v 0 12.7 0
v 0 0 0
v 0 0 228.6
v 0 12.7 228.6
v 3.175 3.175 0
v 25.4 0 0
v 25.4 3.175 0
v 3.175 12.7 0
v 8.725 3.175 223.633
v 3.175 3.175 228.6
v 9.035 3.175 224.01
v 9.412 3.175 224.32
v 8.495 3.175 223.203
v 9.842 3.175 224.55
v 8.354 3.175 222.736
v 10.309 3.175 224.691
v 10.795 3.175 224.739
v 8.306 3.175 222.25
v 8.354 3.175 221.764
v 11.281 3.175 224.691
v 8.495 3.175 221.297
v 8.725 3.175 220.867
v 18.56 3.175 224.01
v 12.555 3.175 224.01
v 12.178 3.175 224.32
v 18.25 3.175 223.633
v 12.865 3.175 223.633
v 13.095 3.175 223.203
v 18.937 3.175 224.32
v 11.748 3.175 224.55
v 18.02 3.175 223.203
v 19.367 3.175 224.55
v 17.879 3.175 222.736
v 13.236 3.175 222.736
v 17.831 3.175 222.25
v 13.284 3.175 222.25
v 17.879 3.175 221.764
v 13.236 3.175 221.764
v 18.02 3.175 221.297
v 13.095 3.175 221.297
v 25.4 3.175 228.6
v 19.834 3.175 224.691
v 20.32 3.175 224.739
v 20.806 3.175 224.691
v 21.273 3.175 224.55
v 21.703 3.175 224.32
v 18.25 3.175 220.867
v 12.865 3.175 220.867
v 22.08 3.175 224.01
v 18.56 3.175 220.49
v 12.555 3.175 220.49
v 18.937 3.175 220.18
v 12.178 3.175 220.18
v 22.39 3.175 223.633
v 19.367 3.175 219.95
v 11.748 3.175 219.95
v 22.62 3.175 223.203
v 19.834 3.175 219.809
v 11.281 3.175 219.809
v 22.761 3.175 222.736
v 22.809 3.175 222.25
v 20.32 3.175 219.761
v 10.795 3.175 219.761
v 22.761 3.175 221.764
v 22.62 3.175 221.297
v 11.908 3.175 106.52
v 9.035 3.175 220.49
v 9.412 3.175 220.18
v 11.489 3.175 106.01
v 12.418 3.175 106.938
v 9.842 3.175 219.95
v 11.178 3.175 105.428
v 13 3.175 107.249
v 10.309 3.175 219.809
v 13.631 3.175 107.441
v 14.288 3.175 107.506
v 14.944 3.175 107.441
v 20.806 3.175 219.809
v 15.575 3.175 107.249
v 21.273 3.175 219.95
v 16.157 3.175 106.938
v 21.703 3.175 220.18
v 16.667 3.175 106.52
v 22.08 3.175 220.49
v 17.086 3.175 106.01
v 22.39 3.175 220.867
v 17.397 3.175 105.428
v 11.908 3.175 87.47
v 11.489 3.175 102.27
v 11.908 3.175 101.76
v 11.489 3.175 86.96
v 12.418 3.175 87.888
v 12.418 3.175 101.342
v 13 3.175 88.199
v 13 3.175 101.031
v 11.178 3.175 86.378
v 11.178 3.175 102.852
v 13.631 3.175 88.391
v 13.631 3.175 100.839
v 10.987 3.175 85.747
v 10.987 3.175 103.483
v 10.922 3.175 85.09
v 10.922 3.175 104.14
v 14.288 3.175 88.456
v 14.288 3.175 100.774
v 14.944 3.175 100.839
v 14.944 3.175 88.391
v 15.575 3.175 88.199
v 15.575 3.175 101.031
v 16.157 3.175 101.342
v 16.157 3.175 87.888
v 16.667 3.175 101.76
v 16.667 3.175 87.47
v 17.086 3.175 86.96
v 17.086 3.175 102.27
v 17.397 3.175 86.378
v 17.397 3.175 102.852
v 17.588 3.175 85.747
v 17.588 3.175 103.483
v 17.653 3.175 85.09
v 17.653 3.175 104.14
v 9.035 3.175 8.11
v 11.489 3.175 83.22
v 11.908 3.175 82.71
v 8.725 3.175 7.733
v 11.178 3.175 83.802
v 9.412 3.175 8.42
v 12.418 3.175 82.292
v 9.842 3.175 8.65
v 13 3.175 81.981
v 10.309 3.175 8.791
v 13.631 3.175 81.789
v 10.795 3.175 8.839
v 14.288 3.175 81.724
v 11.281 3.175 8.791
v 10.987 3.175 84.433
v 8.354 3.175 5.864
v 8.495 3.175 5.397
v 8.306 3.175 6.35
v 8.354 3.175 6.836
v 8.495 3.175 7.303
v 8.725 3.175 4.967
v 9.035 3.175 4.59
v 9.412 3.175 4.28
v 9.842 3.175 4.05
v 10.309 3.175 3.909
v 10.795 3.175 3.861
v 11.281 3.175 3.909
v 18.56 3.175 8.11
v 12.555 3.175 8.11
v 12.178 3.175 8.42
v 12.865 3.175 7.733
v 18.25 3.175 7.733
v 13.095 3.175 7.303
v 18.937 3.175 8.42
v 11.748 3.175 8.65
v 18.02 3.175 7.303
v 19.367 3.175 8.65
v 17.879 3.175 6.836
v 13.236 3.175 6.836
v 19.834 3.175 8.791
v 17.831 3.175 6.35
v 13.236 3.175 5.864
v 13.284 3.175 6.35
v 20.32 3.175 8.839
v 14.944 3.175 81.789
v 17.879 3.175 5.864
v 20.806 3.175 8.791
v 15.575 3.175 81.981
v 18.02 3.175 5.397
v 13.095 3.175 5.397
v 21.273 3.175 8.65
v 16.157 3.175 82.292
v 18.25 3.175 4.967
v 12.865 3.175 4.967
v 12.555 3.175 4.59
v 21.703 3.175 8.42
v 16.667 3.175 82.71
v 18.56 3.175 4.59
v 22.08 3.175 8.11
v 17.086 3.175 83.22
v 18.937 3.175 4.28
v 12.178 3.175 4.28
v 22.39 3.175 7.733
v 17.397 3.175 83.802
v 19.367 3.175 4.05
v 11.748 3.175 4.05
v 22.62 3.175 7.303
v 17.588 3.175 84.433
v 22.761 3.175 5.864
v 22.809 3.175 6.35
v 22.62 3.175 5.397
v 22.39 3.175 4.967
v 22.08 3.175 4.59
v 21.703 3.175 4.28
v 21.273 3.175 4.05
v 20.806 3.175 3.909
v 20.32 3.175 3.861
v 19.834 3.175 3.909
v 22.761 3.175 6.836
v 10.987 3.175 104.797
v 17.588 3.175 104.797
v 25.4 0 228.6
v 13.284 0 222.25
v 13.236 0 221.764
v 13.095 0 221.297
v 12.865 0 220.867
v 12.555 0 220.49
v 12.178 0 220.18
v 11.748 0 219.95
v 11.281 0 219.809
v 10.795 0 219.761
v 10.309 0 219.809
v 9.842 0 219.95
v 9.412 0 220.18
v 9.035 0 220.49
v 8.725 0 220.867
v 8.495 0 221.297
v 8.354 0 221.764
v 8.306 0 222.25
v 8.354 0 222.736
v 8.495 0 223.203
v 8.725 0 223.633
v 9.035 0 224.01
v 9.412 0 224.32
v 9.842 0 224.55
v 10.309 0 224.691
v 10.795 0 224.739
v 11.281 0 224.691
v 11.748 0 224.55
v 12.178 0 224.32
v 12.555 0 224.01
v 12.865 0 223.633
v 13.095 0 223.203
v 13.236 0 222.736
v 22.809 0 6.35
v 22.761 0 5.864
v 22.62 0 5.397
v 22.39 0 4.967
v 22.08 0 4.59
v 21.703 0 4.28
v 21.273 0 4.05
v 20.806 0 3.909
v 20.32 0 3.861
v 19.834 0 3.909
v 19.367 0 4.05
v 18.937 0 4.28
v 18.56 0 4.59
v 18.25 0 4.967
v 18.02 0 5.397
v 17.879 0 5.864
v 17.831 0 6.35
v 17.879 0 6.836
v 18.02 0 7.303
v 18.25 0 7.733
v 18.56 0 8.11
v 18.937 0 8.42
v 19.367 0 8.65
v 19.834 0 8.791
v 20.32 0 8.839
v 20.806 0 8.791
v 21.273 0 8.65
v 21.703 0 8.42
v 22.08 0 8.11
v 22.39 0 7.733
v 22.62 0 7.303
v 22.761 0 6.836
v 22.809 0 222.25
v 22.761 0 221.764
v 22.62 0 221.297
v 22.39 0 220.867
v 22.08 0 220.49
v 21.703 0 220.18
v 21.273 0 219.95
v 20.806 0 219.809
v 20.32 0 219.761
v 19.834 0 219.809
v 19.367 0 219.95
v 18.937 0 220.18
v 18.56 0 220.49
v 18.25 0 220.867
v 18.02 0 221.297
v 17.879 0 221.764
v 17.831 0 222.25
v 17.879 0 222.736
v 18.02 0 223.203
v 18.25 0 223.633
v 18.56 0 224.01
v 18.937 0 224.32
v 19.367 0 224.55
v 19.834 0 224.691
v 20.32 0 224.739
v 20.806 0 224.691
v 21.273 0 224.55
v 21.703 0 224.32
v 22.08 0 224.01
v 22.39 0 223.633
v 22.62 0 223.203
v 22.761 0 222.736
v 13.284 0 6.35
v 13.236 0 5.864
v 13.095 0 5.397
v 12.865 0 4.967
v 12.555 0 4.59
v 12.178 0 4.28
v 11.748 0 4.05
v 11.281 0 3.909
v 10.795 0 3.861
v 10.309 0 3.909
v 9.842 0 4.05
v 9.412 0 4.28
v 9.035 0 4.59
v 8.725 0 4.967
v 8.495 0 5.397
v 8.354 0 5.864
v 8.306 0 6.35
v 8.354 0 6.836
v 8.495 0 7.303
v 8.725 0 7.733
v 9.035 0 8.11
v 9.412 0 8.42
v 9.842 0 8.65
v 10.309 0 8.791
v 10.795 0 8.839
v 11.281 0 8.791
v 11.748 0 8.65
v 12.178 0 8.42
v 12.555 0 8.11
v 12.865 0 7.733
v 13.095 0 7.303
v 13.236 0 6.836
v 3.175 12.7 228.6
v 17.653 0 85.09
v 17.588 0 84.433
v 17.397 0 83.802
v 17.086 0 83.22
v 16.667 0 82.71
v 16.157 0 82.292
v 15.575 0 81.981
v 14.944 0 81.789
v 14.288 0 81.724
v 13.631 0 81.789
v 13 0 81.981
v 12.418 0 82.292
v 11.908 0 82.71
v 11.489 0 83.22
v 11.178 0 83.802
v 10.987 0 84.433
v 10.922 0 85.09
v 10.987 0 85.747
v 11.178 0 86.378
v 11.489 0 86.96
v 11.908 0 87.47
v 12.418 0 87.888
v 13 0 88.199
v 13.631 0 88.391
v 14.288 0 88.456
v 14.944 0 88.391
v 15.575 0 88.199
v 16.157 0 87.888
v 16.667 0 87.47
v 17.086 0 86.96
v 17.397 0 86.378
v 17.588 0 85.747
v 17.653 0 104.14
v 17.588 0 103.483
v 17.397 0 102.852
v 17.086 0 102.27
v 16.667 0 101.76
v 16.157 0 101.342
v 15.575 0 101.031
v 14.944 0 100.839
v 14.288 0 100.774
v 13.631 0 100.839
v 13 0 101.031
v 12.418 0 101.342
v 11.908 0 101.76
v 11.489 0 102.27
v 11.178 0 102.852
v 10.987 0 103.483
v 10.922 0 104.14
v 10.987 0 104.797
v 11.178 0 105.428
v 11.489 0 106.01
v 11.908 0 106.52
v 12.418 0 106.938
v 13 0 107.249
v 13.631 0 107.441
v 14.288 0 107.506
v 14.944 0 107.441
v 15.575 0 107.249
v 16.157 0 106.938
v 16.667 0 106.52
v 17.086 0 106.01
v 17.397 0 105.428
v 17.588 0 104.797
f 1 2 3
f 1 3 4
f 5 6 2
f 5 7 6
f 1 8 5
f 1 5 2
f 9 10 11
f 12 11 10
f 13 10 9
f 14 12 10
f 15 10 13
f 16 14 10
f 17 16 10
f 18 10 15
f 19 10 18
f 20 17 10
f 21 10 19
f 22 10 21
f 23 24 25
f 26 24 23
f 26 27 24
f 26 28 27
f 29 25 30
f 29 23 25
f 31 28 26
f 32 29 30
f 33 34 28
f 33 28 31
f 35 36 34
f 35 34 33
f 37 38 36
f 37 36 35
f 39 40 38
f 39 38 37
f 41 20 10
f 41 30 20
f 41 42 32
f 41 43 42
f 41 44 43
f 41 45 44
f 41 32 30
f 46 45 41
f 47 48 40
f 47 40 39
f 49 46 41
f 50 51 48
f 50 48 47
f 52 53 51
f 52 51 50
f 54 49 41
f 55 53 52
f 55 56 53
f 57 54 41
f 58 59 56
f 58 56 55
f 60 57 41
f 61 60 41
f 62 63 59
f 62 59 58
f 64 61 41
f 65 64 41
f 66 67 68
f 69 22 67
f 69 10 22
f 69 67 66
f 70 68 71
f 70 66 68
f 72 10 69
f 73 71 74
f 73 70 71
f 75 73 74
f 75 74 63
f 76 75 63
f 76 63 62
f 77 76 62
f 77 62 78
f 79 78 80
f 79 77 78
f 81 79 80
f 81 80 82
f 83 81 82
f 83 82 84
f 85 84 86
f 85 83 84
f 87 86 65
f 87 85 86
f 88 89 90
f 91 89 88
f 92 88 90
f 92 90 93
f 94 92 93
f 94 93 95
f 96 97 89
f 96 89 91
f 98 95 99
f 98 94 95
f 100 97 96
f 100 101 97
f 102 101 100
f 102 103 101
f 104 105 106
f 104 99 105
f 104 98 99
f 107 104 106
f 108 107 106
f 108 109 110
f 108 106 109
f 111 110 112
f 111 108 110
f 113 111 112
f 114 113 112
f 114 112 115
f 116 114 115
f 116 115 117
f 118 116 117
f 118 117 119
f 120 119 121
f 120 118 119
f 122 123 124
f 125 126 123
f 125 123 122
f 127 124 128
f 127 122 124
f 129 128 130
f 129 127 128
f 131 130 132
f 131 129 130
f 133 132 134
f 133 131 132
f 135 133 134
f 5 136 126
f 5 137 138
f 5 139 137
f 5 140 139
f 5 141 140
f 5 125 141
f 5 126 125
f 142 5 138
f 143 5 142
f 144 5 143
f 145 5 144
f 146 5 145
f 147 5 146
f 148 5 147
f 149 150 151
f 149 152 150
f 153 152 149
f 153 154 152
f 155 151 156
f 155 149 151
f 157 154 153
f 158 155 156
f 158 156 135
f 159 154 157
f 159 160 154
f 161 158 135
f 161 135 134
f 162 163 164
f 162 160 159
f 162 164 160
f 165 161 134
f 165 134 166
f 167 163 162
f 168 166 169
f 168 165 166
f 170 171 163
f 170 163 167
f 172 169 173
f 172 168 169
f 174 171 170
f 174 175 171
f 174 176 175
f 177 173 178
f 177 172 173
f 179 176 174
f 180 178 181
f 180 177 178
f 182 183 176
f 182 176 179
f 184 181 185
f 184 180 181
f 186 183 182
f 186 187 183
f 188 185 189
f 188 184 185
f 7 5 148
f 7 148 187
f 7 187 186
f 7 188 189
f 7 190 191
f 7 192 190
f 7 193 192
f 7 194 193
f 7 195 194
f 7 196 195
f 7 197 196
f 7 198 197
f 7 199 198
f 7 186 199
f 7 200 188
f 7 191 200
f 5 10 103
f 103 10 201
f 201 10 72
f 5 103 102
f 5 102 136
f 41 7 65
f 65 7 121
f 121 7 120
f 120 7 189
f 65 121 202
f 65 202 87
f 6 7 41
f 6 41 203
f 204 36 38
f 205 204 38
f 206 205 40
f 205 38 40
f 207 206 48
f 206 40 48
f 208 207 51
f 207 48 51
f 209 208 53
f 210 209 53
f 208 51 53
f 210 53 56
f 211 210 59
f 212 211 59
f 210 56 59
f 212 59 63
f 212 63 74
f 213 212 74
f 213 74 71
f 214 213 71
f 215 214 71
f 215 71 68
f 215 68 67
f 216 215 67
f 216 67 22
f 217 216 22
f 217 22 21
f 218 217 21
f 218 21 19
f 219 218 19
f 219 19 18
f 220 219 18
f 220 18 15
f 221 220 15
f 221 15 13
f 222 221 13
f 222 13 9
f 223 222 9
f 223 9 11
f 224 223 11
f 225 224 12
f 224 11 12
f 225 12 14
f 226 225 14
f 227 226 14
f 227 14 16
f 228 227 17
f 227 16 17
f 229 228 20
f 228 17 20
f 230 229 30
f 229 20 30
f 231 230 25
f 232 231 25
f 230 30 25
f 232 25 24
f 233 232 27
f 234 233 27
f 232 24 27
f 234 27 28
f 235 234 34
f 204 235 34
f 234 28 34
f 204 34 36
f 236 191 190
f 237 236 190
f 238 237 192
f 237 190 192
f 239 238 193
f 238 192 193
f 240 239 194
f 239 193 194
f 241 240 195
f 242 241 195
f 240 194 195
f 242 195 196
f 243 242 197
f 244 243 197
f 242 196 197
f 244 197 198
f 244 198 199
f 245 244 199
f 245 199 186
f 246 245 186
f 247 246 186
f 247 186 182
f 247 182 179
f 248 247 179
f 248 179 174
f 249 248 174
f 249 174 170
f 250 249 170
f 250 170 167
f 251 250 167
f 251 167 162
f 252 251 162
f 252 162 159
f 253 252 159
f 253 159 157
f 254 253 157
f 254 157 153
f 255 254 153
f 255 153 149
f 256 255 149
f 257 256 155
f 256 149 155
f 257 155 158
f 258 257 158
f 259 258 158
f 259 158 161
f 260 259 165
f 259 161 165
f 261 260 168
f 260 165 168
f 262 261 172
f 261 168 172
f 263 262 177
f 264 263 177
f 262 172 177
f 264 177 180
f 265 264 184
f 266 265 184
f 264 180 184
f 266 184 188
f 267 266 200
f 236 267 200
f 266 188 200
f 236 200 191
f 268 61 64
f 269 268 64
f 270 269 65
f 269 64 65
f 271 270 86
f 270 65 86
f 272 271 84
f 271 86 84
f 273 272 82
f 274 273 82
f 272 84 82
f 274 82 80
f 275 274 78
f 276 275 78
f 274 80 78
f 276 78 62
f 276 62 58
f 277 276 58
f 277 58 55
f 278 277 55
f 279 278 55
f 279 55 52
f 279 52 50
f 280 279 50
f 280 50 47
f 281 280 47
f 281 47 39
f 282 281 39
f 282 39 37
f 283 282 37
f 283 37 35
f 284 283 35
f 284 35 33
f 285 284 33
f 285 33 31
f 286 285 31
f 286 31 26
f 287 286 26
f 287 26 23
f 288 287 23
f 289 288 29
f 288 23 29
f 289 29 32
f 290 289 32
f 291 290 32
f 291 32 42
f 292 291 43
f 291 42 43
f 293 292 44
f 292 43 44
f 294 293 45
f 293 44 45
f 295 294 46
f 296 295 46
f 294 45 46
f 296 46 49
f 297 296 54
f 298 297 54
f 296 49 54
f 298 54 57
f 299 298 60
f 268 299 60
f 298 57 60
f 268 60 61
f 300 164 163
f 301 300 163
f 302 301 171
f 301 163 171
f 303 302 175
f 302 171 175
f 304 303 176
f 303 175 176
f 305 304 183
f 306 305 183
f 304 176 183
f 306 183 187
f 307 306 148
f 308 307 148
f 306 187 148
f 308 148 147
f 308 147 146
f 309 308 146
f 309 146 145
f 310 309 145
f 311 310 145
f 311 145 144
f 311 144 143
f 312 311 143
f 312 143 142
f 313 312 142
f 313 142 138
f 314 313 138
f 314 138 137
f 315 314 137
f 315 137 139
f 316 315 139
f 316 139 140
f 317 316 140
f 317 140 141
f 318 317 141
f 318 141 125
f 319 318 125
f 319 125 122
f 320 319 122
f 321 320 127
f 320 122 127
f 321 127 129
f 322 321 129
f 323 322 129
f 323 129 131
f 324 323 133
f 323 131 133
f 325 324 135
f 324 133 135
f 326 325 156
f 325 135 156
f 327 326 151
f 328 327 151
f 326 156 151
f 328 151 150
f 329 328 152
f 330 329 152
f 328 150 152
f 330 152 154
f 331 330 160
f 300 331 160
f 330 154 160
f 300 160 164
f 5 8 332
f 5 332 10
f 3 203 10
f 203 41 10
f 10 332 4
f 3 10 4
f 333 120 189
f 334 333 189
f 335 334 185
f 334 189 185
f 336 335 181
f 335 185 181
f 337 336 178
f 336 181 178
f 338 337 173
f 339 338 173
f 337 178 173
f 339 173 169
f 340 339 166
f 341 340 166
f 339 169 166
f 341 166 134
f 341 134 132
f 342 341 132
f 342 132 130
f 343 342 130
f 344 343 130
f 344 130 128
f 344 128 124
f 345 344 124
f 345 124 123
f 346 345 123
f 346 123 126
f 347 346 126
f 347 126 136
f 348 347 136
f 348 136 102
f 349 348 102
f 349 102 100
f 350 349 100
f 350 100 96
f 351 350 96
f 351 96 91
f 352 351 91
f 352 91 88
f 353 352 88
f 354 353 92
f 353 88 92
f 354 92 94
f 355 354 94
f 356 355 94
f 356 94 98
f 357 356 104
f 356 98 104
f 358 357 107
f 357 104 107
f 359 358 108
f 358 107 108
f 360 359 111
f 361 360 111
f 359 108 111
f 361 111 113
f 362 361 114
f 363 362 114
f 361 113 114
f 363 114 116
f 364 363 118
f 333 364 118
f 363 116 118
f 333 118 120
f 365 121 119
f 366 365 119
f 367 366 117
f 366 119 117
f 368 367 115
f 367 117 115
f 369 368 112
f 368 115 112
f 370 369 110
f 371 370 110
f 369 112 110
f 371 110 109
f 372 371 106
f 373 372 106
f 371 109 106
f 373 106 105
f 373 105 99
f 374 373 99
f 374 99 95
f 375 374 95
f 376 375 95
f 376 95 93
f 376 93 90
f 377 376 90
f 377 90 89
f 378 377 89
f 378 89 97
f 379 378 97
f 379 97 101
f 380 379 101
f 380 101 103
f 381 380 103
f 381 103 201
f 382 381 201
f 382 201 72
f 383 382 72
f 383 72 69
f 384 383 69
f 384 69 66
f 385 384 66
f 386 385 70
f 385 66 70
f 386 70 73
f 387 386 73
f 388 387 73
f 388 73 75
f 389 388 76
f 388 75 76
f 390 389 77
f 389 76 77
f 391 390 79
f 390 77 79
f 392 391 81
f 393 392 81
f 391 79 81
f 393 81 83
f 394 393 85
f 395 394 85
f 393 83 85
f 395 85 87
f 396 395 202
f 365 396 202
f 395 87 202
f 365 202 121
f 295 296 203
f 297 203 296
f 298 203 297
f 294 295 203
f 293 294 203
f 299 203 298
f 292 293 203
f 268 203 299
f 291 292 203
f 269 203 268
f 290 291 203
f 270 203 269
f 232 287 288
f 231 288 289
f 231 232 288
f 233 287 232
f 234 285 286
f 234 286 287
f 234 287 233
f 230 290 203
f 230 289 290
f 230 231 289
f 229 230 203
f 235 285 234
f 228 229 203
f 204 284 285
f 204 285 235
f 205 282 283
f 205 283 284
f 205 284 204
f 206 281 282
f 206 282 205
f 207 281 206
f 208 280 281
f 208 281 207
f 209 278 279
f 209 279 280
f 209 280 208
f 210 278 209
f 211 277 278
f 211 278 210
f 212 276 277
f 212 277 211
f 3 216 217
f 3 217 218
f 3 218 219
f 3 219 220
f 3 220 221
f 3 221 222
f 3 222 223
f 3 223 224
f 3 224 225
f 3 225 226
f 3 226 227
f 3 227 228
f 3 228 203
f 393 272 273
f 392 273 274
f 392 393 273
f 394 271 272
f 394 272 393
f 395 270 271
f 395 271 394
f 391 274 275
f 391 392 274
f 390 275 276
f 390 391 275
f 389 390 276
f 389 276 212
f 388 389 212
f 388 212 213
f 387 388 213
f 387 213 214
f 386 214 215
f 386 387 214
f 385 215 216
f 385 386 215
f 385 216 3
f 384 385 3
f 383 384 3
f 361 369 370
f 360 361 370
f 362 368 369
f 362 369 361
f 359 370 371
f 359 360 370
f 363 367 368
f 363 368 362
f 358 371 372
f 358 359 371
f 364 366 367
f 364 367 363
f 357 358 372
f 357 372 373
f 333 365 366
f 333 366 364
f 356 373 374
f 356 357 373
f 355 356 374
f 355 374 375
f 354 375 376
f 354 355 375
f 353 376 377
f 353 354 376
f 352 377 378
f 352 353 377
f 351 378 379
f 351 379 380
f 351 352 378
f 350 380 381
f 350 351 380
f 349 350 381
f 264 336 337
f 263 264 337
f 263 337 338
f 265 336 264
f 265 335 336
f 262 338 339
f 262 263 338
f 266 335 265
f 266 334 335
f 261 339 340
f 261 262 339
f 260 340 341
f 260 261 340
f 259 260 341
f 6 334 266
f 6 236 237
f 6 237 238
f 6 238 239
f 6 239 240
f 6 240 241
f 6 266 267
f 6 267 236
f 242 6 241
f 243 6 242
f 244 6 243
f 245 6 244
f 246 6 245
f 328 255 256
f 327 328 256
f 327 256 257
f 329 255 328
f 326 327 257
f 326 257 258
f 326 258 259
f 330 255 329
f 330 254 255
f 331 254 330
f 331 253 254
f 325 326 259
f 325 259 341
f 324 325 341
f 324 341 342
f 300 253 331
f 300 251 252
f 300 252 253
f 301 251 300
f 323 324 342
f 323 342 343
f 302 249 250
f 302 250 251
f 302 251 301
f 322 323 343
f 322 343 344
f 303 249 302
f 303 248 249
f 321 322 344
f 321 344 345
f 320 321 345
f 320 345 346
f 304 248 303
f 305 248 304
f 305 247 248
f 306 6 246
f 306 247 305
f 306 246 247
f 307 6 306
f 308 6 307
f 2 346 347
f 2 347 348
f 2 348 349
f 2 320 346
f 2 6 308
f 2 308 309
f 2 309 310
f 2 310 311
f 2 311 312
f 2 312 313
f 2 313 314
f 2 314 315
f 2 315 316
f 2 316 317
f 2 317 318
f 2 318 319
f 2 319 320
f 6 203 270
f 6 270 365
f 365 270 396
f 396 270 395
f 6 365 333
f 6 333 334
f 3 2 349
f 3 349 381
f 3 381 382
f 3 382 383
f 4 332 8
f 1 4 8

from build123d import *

# Parameters (mm, degrees)
BOSS_EXTRUDE1_DEPTH = 228.6
SKETCH2_R           = 2.4892
CUT_EXTRUDE1_DEPTH  = 4.175
SKETCH3_W           = 228.6
SKETCH3_H           = 12.7
CUT_EXTRUDE2_DEPTH  = 4.175
SKETCH4_R           = 3.3655
CUT_EXTRUDE3_DEPTH  = 4.175


with BuildPart() as part:
    # Sketch1 → Boss-Extrude1 (new body)
    with BuildSketch(Plane.XY):
        Polygon((0, 0), (0, 25.4), (3.175, 25.4), (3.175, 3.175), (25.4, 3.175), (25.4, 0), align=None)
    extrude(amount=BOSS_EXTRUDE1_DEPTH)

    # Sketch2 → Cut-Extrude1 (cut, through all)
    with BuildSketch(Plane(origin=(0, 3.175, 0), x_dir=(1, 0, 0), z_dir=(0, 1, 0))):
        with Locations((20.32, -222.25)):
            Circle(SKETCH2_R)
        with Locations((10.795, -222.25)):
            Circle(SKETCH2_R)
        with Locations((20.32, -6.35)):
            Circle(SKETCH2_R)
        with Locations((10.795, -6.35)):
            Circle(SKETCH2_R)
    extrude(amount=-CUT_EXTRUDE1_DEPTH, mode=Mode.SUBTRACT)

    # Sketch3 → Cut-Extrude2 (cut, through all)
    with BuildSketch(Plane(origin=(3.175, 0, 0), x_dir=(0, 0, -1), z_dir=(1, 0, 0))):
        with Locations((-114.3, 19.05)):
            Rectangle(SKETCH3_W, SKETCH3_H)
    extrude(amount=-CUT_EXTRUDE2_DEPTH, mode=Mode.SUBTRACT)

    # Sketch4 → Cut-Extrude3 (cut, through all)
    with BuildSketch(Plane(origin=(0, 3.175, 0), x_dir=(1, 0, 0), z_dir=(0, 1, 0))):
        with Locations((14.2875, -85.09)):
            Circle(SKETCH4_R)
        with Locations((14.2875, -104.14)):
            Circle(SKETCH4_R)
    extrude(amount=-CUT_EXTRUDE3_DEPTH, mode=Mode.SUBTRACT)


solid = part.part
